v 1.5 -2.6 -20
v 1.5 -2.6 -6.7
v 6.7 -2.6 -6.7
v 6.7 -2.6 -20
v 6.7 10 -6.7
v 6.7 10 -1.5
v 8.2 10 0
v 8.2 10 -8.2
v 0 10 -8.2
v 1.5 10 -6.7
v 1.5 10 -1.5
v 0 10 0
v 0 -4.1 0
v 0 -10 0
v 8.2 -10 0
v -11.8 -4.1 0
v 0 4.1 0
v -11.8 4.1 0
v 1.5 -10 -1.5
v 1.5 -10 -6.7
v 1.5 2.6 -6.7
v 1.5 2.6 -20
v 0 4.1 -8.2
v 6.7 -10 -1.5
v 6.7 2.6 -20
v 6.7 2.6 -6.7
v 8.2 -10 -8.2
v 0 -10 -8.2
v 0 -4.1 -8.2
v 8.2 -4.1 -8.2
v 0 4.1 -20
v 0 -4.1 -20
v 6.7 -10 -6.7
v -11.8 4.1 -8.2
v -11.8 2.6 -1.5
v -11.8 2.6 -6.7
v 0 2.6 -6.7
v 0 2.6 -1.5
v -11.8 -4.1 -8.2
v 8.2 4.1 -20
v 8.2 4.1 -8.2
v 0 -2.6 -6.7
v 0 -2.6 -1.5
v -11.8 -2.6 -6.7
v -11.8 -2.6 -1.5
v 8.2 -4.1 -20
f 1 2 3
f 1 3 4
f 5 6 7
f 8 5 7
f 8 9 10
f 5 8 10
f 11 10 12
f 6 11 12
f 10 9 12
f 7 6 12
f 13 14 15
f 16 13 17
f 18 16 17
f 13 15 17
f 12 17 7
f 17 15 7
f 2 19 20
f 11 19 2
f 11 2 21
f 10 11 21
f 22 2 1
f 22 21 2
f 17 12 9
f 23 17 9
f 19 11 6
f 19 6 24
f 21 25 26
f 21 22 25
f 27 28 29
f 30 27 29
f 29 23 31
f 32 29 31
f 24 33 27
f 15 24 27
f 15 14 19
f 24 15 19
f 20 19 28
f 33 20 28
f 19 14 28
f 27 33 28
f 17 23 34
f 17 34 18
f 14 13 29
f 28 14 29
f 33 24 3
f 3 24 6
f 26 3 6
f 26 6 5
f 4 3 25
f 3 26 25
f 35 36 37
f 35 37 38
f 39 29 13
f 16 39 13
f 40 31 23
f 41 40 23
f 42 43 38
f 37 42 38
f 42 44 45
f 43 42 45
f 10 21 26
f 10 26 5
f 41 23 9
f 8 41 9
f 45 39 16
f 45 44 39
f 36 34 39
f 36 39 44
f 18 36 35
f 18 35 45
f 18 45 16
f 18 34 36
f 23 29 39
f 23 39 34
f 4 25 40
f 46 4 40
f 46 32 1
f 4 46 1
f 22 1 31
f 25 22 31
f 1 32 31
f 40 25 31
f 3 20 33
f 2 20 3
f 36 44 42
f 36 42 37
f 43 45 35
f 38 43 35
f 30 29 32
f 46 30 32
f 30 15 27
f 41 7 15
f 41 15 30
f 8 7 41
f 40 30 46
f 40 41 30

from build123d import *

# Parameters (mm, degrees)
BOSS_EXTRUDE1_DEPTH = 8.2
SHELL1_T            = -1.5
SKETCH2_W           = 8.2
SKETCH2_H           = 8.2
BOSS_EXTRUDE2_DEPTH = 11.8
SHELL2_START        = -11.8
SHELL2_OUTLINE_W    = 5.2
SHELL2_OUTLINE_H    = 5.2
SHELL2_DEPTH        = 11.8


# Read off the part's stored shape, not the designer's step: Shell2
with BuildPart() as part:
    # Sketch1 → Boss-Extrude1 (new body)
    with BuildSketch(Plane(origin=(0, 0, 0), x_dir=(0, 0, -1), z_dir=(1, 0, 0))):
        Polygon((0, 10), (0, -10), (8.2, -10), (8.2, -4.1), (20, -4.1), (20, 4.1), (8.2, 4.1), (8.2, 10), align=None)
    extrude(amount=BOSS_EXTRUDE1_DEPTH)

    # Shell1
    shell1_openings = [part.faces().sort_by_distance(p)[0] for p in [
        (4.1, -10, -4.1),
        (4.1, 10, -4.1),
        (4.1, 0, -20),
    ]]
    offset(amount=SHELL1_T, openings=shell1_openings, kind=Kind.INTERSECTION)

    # Sketch2 → Boss-Extrude2 (add)
    with BuildSketch(Plane.ZY):
        with Locations((-4.1, 0)):
            Rectangle(SKETCH2_W, SKETCH2_H)
    extrude(amount=BOSS_EXTRUDE2_DEPTH)

    # Shell2 outline → Shell2 (cut)
    with BuildSketch(Plane.YZ.offset(SHELL2_START)):
        with Locations((0, -4.1)):
            Rectangle(SHELL2_OUTLINE_W, SHELL2_OUTLINE_H)
    extrude(amount=SHELL2_DEPTH, mode=Mode.SUBTRACT)


solid = part.part
